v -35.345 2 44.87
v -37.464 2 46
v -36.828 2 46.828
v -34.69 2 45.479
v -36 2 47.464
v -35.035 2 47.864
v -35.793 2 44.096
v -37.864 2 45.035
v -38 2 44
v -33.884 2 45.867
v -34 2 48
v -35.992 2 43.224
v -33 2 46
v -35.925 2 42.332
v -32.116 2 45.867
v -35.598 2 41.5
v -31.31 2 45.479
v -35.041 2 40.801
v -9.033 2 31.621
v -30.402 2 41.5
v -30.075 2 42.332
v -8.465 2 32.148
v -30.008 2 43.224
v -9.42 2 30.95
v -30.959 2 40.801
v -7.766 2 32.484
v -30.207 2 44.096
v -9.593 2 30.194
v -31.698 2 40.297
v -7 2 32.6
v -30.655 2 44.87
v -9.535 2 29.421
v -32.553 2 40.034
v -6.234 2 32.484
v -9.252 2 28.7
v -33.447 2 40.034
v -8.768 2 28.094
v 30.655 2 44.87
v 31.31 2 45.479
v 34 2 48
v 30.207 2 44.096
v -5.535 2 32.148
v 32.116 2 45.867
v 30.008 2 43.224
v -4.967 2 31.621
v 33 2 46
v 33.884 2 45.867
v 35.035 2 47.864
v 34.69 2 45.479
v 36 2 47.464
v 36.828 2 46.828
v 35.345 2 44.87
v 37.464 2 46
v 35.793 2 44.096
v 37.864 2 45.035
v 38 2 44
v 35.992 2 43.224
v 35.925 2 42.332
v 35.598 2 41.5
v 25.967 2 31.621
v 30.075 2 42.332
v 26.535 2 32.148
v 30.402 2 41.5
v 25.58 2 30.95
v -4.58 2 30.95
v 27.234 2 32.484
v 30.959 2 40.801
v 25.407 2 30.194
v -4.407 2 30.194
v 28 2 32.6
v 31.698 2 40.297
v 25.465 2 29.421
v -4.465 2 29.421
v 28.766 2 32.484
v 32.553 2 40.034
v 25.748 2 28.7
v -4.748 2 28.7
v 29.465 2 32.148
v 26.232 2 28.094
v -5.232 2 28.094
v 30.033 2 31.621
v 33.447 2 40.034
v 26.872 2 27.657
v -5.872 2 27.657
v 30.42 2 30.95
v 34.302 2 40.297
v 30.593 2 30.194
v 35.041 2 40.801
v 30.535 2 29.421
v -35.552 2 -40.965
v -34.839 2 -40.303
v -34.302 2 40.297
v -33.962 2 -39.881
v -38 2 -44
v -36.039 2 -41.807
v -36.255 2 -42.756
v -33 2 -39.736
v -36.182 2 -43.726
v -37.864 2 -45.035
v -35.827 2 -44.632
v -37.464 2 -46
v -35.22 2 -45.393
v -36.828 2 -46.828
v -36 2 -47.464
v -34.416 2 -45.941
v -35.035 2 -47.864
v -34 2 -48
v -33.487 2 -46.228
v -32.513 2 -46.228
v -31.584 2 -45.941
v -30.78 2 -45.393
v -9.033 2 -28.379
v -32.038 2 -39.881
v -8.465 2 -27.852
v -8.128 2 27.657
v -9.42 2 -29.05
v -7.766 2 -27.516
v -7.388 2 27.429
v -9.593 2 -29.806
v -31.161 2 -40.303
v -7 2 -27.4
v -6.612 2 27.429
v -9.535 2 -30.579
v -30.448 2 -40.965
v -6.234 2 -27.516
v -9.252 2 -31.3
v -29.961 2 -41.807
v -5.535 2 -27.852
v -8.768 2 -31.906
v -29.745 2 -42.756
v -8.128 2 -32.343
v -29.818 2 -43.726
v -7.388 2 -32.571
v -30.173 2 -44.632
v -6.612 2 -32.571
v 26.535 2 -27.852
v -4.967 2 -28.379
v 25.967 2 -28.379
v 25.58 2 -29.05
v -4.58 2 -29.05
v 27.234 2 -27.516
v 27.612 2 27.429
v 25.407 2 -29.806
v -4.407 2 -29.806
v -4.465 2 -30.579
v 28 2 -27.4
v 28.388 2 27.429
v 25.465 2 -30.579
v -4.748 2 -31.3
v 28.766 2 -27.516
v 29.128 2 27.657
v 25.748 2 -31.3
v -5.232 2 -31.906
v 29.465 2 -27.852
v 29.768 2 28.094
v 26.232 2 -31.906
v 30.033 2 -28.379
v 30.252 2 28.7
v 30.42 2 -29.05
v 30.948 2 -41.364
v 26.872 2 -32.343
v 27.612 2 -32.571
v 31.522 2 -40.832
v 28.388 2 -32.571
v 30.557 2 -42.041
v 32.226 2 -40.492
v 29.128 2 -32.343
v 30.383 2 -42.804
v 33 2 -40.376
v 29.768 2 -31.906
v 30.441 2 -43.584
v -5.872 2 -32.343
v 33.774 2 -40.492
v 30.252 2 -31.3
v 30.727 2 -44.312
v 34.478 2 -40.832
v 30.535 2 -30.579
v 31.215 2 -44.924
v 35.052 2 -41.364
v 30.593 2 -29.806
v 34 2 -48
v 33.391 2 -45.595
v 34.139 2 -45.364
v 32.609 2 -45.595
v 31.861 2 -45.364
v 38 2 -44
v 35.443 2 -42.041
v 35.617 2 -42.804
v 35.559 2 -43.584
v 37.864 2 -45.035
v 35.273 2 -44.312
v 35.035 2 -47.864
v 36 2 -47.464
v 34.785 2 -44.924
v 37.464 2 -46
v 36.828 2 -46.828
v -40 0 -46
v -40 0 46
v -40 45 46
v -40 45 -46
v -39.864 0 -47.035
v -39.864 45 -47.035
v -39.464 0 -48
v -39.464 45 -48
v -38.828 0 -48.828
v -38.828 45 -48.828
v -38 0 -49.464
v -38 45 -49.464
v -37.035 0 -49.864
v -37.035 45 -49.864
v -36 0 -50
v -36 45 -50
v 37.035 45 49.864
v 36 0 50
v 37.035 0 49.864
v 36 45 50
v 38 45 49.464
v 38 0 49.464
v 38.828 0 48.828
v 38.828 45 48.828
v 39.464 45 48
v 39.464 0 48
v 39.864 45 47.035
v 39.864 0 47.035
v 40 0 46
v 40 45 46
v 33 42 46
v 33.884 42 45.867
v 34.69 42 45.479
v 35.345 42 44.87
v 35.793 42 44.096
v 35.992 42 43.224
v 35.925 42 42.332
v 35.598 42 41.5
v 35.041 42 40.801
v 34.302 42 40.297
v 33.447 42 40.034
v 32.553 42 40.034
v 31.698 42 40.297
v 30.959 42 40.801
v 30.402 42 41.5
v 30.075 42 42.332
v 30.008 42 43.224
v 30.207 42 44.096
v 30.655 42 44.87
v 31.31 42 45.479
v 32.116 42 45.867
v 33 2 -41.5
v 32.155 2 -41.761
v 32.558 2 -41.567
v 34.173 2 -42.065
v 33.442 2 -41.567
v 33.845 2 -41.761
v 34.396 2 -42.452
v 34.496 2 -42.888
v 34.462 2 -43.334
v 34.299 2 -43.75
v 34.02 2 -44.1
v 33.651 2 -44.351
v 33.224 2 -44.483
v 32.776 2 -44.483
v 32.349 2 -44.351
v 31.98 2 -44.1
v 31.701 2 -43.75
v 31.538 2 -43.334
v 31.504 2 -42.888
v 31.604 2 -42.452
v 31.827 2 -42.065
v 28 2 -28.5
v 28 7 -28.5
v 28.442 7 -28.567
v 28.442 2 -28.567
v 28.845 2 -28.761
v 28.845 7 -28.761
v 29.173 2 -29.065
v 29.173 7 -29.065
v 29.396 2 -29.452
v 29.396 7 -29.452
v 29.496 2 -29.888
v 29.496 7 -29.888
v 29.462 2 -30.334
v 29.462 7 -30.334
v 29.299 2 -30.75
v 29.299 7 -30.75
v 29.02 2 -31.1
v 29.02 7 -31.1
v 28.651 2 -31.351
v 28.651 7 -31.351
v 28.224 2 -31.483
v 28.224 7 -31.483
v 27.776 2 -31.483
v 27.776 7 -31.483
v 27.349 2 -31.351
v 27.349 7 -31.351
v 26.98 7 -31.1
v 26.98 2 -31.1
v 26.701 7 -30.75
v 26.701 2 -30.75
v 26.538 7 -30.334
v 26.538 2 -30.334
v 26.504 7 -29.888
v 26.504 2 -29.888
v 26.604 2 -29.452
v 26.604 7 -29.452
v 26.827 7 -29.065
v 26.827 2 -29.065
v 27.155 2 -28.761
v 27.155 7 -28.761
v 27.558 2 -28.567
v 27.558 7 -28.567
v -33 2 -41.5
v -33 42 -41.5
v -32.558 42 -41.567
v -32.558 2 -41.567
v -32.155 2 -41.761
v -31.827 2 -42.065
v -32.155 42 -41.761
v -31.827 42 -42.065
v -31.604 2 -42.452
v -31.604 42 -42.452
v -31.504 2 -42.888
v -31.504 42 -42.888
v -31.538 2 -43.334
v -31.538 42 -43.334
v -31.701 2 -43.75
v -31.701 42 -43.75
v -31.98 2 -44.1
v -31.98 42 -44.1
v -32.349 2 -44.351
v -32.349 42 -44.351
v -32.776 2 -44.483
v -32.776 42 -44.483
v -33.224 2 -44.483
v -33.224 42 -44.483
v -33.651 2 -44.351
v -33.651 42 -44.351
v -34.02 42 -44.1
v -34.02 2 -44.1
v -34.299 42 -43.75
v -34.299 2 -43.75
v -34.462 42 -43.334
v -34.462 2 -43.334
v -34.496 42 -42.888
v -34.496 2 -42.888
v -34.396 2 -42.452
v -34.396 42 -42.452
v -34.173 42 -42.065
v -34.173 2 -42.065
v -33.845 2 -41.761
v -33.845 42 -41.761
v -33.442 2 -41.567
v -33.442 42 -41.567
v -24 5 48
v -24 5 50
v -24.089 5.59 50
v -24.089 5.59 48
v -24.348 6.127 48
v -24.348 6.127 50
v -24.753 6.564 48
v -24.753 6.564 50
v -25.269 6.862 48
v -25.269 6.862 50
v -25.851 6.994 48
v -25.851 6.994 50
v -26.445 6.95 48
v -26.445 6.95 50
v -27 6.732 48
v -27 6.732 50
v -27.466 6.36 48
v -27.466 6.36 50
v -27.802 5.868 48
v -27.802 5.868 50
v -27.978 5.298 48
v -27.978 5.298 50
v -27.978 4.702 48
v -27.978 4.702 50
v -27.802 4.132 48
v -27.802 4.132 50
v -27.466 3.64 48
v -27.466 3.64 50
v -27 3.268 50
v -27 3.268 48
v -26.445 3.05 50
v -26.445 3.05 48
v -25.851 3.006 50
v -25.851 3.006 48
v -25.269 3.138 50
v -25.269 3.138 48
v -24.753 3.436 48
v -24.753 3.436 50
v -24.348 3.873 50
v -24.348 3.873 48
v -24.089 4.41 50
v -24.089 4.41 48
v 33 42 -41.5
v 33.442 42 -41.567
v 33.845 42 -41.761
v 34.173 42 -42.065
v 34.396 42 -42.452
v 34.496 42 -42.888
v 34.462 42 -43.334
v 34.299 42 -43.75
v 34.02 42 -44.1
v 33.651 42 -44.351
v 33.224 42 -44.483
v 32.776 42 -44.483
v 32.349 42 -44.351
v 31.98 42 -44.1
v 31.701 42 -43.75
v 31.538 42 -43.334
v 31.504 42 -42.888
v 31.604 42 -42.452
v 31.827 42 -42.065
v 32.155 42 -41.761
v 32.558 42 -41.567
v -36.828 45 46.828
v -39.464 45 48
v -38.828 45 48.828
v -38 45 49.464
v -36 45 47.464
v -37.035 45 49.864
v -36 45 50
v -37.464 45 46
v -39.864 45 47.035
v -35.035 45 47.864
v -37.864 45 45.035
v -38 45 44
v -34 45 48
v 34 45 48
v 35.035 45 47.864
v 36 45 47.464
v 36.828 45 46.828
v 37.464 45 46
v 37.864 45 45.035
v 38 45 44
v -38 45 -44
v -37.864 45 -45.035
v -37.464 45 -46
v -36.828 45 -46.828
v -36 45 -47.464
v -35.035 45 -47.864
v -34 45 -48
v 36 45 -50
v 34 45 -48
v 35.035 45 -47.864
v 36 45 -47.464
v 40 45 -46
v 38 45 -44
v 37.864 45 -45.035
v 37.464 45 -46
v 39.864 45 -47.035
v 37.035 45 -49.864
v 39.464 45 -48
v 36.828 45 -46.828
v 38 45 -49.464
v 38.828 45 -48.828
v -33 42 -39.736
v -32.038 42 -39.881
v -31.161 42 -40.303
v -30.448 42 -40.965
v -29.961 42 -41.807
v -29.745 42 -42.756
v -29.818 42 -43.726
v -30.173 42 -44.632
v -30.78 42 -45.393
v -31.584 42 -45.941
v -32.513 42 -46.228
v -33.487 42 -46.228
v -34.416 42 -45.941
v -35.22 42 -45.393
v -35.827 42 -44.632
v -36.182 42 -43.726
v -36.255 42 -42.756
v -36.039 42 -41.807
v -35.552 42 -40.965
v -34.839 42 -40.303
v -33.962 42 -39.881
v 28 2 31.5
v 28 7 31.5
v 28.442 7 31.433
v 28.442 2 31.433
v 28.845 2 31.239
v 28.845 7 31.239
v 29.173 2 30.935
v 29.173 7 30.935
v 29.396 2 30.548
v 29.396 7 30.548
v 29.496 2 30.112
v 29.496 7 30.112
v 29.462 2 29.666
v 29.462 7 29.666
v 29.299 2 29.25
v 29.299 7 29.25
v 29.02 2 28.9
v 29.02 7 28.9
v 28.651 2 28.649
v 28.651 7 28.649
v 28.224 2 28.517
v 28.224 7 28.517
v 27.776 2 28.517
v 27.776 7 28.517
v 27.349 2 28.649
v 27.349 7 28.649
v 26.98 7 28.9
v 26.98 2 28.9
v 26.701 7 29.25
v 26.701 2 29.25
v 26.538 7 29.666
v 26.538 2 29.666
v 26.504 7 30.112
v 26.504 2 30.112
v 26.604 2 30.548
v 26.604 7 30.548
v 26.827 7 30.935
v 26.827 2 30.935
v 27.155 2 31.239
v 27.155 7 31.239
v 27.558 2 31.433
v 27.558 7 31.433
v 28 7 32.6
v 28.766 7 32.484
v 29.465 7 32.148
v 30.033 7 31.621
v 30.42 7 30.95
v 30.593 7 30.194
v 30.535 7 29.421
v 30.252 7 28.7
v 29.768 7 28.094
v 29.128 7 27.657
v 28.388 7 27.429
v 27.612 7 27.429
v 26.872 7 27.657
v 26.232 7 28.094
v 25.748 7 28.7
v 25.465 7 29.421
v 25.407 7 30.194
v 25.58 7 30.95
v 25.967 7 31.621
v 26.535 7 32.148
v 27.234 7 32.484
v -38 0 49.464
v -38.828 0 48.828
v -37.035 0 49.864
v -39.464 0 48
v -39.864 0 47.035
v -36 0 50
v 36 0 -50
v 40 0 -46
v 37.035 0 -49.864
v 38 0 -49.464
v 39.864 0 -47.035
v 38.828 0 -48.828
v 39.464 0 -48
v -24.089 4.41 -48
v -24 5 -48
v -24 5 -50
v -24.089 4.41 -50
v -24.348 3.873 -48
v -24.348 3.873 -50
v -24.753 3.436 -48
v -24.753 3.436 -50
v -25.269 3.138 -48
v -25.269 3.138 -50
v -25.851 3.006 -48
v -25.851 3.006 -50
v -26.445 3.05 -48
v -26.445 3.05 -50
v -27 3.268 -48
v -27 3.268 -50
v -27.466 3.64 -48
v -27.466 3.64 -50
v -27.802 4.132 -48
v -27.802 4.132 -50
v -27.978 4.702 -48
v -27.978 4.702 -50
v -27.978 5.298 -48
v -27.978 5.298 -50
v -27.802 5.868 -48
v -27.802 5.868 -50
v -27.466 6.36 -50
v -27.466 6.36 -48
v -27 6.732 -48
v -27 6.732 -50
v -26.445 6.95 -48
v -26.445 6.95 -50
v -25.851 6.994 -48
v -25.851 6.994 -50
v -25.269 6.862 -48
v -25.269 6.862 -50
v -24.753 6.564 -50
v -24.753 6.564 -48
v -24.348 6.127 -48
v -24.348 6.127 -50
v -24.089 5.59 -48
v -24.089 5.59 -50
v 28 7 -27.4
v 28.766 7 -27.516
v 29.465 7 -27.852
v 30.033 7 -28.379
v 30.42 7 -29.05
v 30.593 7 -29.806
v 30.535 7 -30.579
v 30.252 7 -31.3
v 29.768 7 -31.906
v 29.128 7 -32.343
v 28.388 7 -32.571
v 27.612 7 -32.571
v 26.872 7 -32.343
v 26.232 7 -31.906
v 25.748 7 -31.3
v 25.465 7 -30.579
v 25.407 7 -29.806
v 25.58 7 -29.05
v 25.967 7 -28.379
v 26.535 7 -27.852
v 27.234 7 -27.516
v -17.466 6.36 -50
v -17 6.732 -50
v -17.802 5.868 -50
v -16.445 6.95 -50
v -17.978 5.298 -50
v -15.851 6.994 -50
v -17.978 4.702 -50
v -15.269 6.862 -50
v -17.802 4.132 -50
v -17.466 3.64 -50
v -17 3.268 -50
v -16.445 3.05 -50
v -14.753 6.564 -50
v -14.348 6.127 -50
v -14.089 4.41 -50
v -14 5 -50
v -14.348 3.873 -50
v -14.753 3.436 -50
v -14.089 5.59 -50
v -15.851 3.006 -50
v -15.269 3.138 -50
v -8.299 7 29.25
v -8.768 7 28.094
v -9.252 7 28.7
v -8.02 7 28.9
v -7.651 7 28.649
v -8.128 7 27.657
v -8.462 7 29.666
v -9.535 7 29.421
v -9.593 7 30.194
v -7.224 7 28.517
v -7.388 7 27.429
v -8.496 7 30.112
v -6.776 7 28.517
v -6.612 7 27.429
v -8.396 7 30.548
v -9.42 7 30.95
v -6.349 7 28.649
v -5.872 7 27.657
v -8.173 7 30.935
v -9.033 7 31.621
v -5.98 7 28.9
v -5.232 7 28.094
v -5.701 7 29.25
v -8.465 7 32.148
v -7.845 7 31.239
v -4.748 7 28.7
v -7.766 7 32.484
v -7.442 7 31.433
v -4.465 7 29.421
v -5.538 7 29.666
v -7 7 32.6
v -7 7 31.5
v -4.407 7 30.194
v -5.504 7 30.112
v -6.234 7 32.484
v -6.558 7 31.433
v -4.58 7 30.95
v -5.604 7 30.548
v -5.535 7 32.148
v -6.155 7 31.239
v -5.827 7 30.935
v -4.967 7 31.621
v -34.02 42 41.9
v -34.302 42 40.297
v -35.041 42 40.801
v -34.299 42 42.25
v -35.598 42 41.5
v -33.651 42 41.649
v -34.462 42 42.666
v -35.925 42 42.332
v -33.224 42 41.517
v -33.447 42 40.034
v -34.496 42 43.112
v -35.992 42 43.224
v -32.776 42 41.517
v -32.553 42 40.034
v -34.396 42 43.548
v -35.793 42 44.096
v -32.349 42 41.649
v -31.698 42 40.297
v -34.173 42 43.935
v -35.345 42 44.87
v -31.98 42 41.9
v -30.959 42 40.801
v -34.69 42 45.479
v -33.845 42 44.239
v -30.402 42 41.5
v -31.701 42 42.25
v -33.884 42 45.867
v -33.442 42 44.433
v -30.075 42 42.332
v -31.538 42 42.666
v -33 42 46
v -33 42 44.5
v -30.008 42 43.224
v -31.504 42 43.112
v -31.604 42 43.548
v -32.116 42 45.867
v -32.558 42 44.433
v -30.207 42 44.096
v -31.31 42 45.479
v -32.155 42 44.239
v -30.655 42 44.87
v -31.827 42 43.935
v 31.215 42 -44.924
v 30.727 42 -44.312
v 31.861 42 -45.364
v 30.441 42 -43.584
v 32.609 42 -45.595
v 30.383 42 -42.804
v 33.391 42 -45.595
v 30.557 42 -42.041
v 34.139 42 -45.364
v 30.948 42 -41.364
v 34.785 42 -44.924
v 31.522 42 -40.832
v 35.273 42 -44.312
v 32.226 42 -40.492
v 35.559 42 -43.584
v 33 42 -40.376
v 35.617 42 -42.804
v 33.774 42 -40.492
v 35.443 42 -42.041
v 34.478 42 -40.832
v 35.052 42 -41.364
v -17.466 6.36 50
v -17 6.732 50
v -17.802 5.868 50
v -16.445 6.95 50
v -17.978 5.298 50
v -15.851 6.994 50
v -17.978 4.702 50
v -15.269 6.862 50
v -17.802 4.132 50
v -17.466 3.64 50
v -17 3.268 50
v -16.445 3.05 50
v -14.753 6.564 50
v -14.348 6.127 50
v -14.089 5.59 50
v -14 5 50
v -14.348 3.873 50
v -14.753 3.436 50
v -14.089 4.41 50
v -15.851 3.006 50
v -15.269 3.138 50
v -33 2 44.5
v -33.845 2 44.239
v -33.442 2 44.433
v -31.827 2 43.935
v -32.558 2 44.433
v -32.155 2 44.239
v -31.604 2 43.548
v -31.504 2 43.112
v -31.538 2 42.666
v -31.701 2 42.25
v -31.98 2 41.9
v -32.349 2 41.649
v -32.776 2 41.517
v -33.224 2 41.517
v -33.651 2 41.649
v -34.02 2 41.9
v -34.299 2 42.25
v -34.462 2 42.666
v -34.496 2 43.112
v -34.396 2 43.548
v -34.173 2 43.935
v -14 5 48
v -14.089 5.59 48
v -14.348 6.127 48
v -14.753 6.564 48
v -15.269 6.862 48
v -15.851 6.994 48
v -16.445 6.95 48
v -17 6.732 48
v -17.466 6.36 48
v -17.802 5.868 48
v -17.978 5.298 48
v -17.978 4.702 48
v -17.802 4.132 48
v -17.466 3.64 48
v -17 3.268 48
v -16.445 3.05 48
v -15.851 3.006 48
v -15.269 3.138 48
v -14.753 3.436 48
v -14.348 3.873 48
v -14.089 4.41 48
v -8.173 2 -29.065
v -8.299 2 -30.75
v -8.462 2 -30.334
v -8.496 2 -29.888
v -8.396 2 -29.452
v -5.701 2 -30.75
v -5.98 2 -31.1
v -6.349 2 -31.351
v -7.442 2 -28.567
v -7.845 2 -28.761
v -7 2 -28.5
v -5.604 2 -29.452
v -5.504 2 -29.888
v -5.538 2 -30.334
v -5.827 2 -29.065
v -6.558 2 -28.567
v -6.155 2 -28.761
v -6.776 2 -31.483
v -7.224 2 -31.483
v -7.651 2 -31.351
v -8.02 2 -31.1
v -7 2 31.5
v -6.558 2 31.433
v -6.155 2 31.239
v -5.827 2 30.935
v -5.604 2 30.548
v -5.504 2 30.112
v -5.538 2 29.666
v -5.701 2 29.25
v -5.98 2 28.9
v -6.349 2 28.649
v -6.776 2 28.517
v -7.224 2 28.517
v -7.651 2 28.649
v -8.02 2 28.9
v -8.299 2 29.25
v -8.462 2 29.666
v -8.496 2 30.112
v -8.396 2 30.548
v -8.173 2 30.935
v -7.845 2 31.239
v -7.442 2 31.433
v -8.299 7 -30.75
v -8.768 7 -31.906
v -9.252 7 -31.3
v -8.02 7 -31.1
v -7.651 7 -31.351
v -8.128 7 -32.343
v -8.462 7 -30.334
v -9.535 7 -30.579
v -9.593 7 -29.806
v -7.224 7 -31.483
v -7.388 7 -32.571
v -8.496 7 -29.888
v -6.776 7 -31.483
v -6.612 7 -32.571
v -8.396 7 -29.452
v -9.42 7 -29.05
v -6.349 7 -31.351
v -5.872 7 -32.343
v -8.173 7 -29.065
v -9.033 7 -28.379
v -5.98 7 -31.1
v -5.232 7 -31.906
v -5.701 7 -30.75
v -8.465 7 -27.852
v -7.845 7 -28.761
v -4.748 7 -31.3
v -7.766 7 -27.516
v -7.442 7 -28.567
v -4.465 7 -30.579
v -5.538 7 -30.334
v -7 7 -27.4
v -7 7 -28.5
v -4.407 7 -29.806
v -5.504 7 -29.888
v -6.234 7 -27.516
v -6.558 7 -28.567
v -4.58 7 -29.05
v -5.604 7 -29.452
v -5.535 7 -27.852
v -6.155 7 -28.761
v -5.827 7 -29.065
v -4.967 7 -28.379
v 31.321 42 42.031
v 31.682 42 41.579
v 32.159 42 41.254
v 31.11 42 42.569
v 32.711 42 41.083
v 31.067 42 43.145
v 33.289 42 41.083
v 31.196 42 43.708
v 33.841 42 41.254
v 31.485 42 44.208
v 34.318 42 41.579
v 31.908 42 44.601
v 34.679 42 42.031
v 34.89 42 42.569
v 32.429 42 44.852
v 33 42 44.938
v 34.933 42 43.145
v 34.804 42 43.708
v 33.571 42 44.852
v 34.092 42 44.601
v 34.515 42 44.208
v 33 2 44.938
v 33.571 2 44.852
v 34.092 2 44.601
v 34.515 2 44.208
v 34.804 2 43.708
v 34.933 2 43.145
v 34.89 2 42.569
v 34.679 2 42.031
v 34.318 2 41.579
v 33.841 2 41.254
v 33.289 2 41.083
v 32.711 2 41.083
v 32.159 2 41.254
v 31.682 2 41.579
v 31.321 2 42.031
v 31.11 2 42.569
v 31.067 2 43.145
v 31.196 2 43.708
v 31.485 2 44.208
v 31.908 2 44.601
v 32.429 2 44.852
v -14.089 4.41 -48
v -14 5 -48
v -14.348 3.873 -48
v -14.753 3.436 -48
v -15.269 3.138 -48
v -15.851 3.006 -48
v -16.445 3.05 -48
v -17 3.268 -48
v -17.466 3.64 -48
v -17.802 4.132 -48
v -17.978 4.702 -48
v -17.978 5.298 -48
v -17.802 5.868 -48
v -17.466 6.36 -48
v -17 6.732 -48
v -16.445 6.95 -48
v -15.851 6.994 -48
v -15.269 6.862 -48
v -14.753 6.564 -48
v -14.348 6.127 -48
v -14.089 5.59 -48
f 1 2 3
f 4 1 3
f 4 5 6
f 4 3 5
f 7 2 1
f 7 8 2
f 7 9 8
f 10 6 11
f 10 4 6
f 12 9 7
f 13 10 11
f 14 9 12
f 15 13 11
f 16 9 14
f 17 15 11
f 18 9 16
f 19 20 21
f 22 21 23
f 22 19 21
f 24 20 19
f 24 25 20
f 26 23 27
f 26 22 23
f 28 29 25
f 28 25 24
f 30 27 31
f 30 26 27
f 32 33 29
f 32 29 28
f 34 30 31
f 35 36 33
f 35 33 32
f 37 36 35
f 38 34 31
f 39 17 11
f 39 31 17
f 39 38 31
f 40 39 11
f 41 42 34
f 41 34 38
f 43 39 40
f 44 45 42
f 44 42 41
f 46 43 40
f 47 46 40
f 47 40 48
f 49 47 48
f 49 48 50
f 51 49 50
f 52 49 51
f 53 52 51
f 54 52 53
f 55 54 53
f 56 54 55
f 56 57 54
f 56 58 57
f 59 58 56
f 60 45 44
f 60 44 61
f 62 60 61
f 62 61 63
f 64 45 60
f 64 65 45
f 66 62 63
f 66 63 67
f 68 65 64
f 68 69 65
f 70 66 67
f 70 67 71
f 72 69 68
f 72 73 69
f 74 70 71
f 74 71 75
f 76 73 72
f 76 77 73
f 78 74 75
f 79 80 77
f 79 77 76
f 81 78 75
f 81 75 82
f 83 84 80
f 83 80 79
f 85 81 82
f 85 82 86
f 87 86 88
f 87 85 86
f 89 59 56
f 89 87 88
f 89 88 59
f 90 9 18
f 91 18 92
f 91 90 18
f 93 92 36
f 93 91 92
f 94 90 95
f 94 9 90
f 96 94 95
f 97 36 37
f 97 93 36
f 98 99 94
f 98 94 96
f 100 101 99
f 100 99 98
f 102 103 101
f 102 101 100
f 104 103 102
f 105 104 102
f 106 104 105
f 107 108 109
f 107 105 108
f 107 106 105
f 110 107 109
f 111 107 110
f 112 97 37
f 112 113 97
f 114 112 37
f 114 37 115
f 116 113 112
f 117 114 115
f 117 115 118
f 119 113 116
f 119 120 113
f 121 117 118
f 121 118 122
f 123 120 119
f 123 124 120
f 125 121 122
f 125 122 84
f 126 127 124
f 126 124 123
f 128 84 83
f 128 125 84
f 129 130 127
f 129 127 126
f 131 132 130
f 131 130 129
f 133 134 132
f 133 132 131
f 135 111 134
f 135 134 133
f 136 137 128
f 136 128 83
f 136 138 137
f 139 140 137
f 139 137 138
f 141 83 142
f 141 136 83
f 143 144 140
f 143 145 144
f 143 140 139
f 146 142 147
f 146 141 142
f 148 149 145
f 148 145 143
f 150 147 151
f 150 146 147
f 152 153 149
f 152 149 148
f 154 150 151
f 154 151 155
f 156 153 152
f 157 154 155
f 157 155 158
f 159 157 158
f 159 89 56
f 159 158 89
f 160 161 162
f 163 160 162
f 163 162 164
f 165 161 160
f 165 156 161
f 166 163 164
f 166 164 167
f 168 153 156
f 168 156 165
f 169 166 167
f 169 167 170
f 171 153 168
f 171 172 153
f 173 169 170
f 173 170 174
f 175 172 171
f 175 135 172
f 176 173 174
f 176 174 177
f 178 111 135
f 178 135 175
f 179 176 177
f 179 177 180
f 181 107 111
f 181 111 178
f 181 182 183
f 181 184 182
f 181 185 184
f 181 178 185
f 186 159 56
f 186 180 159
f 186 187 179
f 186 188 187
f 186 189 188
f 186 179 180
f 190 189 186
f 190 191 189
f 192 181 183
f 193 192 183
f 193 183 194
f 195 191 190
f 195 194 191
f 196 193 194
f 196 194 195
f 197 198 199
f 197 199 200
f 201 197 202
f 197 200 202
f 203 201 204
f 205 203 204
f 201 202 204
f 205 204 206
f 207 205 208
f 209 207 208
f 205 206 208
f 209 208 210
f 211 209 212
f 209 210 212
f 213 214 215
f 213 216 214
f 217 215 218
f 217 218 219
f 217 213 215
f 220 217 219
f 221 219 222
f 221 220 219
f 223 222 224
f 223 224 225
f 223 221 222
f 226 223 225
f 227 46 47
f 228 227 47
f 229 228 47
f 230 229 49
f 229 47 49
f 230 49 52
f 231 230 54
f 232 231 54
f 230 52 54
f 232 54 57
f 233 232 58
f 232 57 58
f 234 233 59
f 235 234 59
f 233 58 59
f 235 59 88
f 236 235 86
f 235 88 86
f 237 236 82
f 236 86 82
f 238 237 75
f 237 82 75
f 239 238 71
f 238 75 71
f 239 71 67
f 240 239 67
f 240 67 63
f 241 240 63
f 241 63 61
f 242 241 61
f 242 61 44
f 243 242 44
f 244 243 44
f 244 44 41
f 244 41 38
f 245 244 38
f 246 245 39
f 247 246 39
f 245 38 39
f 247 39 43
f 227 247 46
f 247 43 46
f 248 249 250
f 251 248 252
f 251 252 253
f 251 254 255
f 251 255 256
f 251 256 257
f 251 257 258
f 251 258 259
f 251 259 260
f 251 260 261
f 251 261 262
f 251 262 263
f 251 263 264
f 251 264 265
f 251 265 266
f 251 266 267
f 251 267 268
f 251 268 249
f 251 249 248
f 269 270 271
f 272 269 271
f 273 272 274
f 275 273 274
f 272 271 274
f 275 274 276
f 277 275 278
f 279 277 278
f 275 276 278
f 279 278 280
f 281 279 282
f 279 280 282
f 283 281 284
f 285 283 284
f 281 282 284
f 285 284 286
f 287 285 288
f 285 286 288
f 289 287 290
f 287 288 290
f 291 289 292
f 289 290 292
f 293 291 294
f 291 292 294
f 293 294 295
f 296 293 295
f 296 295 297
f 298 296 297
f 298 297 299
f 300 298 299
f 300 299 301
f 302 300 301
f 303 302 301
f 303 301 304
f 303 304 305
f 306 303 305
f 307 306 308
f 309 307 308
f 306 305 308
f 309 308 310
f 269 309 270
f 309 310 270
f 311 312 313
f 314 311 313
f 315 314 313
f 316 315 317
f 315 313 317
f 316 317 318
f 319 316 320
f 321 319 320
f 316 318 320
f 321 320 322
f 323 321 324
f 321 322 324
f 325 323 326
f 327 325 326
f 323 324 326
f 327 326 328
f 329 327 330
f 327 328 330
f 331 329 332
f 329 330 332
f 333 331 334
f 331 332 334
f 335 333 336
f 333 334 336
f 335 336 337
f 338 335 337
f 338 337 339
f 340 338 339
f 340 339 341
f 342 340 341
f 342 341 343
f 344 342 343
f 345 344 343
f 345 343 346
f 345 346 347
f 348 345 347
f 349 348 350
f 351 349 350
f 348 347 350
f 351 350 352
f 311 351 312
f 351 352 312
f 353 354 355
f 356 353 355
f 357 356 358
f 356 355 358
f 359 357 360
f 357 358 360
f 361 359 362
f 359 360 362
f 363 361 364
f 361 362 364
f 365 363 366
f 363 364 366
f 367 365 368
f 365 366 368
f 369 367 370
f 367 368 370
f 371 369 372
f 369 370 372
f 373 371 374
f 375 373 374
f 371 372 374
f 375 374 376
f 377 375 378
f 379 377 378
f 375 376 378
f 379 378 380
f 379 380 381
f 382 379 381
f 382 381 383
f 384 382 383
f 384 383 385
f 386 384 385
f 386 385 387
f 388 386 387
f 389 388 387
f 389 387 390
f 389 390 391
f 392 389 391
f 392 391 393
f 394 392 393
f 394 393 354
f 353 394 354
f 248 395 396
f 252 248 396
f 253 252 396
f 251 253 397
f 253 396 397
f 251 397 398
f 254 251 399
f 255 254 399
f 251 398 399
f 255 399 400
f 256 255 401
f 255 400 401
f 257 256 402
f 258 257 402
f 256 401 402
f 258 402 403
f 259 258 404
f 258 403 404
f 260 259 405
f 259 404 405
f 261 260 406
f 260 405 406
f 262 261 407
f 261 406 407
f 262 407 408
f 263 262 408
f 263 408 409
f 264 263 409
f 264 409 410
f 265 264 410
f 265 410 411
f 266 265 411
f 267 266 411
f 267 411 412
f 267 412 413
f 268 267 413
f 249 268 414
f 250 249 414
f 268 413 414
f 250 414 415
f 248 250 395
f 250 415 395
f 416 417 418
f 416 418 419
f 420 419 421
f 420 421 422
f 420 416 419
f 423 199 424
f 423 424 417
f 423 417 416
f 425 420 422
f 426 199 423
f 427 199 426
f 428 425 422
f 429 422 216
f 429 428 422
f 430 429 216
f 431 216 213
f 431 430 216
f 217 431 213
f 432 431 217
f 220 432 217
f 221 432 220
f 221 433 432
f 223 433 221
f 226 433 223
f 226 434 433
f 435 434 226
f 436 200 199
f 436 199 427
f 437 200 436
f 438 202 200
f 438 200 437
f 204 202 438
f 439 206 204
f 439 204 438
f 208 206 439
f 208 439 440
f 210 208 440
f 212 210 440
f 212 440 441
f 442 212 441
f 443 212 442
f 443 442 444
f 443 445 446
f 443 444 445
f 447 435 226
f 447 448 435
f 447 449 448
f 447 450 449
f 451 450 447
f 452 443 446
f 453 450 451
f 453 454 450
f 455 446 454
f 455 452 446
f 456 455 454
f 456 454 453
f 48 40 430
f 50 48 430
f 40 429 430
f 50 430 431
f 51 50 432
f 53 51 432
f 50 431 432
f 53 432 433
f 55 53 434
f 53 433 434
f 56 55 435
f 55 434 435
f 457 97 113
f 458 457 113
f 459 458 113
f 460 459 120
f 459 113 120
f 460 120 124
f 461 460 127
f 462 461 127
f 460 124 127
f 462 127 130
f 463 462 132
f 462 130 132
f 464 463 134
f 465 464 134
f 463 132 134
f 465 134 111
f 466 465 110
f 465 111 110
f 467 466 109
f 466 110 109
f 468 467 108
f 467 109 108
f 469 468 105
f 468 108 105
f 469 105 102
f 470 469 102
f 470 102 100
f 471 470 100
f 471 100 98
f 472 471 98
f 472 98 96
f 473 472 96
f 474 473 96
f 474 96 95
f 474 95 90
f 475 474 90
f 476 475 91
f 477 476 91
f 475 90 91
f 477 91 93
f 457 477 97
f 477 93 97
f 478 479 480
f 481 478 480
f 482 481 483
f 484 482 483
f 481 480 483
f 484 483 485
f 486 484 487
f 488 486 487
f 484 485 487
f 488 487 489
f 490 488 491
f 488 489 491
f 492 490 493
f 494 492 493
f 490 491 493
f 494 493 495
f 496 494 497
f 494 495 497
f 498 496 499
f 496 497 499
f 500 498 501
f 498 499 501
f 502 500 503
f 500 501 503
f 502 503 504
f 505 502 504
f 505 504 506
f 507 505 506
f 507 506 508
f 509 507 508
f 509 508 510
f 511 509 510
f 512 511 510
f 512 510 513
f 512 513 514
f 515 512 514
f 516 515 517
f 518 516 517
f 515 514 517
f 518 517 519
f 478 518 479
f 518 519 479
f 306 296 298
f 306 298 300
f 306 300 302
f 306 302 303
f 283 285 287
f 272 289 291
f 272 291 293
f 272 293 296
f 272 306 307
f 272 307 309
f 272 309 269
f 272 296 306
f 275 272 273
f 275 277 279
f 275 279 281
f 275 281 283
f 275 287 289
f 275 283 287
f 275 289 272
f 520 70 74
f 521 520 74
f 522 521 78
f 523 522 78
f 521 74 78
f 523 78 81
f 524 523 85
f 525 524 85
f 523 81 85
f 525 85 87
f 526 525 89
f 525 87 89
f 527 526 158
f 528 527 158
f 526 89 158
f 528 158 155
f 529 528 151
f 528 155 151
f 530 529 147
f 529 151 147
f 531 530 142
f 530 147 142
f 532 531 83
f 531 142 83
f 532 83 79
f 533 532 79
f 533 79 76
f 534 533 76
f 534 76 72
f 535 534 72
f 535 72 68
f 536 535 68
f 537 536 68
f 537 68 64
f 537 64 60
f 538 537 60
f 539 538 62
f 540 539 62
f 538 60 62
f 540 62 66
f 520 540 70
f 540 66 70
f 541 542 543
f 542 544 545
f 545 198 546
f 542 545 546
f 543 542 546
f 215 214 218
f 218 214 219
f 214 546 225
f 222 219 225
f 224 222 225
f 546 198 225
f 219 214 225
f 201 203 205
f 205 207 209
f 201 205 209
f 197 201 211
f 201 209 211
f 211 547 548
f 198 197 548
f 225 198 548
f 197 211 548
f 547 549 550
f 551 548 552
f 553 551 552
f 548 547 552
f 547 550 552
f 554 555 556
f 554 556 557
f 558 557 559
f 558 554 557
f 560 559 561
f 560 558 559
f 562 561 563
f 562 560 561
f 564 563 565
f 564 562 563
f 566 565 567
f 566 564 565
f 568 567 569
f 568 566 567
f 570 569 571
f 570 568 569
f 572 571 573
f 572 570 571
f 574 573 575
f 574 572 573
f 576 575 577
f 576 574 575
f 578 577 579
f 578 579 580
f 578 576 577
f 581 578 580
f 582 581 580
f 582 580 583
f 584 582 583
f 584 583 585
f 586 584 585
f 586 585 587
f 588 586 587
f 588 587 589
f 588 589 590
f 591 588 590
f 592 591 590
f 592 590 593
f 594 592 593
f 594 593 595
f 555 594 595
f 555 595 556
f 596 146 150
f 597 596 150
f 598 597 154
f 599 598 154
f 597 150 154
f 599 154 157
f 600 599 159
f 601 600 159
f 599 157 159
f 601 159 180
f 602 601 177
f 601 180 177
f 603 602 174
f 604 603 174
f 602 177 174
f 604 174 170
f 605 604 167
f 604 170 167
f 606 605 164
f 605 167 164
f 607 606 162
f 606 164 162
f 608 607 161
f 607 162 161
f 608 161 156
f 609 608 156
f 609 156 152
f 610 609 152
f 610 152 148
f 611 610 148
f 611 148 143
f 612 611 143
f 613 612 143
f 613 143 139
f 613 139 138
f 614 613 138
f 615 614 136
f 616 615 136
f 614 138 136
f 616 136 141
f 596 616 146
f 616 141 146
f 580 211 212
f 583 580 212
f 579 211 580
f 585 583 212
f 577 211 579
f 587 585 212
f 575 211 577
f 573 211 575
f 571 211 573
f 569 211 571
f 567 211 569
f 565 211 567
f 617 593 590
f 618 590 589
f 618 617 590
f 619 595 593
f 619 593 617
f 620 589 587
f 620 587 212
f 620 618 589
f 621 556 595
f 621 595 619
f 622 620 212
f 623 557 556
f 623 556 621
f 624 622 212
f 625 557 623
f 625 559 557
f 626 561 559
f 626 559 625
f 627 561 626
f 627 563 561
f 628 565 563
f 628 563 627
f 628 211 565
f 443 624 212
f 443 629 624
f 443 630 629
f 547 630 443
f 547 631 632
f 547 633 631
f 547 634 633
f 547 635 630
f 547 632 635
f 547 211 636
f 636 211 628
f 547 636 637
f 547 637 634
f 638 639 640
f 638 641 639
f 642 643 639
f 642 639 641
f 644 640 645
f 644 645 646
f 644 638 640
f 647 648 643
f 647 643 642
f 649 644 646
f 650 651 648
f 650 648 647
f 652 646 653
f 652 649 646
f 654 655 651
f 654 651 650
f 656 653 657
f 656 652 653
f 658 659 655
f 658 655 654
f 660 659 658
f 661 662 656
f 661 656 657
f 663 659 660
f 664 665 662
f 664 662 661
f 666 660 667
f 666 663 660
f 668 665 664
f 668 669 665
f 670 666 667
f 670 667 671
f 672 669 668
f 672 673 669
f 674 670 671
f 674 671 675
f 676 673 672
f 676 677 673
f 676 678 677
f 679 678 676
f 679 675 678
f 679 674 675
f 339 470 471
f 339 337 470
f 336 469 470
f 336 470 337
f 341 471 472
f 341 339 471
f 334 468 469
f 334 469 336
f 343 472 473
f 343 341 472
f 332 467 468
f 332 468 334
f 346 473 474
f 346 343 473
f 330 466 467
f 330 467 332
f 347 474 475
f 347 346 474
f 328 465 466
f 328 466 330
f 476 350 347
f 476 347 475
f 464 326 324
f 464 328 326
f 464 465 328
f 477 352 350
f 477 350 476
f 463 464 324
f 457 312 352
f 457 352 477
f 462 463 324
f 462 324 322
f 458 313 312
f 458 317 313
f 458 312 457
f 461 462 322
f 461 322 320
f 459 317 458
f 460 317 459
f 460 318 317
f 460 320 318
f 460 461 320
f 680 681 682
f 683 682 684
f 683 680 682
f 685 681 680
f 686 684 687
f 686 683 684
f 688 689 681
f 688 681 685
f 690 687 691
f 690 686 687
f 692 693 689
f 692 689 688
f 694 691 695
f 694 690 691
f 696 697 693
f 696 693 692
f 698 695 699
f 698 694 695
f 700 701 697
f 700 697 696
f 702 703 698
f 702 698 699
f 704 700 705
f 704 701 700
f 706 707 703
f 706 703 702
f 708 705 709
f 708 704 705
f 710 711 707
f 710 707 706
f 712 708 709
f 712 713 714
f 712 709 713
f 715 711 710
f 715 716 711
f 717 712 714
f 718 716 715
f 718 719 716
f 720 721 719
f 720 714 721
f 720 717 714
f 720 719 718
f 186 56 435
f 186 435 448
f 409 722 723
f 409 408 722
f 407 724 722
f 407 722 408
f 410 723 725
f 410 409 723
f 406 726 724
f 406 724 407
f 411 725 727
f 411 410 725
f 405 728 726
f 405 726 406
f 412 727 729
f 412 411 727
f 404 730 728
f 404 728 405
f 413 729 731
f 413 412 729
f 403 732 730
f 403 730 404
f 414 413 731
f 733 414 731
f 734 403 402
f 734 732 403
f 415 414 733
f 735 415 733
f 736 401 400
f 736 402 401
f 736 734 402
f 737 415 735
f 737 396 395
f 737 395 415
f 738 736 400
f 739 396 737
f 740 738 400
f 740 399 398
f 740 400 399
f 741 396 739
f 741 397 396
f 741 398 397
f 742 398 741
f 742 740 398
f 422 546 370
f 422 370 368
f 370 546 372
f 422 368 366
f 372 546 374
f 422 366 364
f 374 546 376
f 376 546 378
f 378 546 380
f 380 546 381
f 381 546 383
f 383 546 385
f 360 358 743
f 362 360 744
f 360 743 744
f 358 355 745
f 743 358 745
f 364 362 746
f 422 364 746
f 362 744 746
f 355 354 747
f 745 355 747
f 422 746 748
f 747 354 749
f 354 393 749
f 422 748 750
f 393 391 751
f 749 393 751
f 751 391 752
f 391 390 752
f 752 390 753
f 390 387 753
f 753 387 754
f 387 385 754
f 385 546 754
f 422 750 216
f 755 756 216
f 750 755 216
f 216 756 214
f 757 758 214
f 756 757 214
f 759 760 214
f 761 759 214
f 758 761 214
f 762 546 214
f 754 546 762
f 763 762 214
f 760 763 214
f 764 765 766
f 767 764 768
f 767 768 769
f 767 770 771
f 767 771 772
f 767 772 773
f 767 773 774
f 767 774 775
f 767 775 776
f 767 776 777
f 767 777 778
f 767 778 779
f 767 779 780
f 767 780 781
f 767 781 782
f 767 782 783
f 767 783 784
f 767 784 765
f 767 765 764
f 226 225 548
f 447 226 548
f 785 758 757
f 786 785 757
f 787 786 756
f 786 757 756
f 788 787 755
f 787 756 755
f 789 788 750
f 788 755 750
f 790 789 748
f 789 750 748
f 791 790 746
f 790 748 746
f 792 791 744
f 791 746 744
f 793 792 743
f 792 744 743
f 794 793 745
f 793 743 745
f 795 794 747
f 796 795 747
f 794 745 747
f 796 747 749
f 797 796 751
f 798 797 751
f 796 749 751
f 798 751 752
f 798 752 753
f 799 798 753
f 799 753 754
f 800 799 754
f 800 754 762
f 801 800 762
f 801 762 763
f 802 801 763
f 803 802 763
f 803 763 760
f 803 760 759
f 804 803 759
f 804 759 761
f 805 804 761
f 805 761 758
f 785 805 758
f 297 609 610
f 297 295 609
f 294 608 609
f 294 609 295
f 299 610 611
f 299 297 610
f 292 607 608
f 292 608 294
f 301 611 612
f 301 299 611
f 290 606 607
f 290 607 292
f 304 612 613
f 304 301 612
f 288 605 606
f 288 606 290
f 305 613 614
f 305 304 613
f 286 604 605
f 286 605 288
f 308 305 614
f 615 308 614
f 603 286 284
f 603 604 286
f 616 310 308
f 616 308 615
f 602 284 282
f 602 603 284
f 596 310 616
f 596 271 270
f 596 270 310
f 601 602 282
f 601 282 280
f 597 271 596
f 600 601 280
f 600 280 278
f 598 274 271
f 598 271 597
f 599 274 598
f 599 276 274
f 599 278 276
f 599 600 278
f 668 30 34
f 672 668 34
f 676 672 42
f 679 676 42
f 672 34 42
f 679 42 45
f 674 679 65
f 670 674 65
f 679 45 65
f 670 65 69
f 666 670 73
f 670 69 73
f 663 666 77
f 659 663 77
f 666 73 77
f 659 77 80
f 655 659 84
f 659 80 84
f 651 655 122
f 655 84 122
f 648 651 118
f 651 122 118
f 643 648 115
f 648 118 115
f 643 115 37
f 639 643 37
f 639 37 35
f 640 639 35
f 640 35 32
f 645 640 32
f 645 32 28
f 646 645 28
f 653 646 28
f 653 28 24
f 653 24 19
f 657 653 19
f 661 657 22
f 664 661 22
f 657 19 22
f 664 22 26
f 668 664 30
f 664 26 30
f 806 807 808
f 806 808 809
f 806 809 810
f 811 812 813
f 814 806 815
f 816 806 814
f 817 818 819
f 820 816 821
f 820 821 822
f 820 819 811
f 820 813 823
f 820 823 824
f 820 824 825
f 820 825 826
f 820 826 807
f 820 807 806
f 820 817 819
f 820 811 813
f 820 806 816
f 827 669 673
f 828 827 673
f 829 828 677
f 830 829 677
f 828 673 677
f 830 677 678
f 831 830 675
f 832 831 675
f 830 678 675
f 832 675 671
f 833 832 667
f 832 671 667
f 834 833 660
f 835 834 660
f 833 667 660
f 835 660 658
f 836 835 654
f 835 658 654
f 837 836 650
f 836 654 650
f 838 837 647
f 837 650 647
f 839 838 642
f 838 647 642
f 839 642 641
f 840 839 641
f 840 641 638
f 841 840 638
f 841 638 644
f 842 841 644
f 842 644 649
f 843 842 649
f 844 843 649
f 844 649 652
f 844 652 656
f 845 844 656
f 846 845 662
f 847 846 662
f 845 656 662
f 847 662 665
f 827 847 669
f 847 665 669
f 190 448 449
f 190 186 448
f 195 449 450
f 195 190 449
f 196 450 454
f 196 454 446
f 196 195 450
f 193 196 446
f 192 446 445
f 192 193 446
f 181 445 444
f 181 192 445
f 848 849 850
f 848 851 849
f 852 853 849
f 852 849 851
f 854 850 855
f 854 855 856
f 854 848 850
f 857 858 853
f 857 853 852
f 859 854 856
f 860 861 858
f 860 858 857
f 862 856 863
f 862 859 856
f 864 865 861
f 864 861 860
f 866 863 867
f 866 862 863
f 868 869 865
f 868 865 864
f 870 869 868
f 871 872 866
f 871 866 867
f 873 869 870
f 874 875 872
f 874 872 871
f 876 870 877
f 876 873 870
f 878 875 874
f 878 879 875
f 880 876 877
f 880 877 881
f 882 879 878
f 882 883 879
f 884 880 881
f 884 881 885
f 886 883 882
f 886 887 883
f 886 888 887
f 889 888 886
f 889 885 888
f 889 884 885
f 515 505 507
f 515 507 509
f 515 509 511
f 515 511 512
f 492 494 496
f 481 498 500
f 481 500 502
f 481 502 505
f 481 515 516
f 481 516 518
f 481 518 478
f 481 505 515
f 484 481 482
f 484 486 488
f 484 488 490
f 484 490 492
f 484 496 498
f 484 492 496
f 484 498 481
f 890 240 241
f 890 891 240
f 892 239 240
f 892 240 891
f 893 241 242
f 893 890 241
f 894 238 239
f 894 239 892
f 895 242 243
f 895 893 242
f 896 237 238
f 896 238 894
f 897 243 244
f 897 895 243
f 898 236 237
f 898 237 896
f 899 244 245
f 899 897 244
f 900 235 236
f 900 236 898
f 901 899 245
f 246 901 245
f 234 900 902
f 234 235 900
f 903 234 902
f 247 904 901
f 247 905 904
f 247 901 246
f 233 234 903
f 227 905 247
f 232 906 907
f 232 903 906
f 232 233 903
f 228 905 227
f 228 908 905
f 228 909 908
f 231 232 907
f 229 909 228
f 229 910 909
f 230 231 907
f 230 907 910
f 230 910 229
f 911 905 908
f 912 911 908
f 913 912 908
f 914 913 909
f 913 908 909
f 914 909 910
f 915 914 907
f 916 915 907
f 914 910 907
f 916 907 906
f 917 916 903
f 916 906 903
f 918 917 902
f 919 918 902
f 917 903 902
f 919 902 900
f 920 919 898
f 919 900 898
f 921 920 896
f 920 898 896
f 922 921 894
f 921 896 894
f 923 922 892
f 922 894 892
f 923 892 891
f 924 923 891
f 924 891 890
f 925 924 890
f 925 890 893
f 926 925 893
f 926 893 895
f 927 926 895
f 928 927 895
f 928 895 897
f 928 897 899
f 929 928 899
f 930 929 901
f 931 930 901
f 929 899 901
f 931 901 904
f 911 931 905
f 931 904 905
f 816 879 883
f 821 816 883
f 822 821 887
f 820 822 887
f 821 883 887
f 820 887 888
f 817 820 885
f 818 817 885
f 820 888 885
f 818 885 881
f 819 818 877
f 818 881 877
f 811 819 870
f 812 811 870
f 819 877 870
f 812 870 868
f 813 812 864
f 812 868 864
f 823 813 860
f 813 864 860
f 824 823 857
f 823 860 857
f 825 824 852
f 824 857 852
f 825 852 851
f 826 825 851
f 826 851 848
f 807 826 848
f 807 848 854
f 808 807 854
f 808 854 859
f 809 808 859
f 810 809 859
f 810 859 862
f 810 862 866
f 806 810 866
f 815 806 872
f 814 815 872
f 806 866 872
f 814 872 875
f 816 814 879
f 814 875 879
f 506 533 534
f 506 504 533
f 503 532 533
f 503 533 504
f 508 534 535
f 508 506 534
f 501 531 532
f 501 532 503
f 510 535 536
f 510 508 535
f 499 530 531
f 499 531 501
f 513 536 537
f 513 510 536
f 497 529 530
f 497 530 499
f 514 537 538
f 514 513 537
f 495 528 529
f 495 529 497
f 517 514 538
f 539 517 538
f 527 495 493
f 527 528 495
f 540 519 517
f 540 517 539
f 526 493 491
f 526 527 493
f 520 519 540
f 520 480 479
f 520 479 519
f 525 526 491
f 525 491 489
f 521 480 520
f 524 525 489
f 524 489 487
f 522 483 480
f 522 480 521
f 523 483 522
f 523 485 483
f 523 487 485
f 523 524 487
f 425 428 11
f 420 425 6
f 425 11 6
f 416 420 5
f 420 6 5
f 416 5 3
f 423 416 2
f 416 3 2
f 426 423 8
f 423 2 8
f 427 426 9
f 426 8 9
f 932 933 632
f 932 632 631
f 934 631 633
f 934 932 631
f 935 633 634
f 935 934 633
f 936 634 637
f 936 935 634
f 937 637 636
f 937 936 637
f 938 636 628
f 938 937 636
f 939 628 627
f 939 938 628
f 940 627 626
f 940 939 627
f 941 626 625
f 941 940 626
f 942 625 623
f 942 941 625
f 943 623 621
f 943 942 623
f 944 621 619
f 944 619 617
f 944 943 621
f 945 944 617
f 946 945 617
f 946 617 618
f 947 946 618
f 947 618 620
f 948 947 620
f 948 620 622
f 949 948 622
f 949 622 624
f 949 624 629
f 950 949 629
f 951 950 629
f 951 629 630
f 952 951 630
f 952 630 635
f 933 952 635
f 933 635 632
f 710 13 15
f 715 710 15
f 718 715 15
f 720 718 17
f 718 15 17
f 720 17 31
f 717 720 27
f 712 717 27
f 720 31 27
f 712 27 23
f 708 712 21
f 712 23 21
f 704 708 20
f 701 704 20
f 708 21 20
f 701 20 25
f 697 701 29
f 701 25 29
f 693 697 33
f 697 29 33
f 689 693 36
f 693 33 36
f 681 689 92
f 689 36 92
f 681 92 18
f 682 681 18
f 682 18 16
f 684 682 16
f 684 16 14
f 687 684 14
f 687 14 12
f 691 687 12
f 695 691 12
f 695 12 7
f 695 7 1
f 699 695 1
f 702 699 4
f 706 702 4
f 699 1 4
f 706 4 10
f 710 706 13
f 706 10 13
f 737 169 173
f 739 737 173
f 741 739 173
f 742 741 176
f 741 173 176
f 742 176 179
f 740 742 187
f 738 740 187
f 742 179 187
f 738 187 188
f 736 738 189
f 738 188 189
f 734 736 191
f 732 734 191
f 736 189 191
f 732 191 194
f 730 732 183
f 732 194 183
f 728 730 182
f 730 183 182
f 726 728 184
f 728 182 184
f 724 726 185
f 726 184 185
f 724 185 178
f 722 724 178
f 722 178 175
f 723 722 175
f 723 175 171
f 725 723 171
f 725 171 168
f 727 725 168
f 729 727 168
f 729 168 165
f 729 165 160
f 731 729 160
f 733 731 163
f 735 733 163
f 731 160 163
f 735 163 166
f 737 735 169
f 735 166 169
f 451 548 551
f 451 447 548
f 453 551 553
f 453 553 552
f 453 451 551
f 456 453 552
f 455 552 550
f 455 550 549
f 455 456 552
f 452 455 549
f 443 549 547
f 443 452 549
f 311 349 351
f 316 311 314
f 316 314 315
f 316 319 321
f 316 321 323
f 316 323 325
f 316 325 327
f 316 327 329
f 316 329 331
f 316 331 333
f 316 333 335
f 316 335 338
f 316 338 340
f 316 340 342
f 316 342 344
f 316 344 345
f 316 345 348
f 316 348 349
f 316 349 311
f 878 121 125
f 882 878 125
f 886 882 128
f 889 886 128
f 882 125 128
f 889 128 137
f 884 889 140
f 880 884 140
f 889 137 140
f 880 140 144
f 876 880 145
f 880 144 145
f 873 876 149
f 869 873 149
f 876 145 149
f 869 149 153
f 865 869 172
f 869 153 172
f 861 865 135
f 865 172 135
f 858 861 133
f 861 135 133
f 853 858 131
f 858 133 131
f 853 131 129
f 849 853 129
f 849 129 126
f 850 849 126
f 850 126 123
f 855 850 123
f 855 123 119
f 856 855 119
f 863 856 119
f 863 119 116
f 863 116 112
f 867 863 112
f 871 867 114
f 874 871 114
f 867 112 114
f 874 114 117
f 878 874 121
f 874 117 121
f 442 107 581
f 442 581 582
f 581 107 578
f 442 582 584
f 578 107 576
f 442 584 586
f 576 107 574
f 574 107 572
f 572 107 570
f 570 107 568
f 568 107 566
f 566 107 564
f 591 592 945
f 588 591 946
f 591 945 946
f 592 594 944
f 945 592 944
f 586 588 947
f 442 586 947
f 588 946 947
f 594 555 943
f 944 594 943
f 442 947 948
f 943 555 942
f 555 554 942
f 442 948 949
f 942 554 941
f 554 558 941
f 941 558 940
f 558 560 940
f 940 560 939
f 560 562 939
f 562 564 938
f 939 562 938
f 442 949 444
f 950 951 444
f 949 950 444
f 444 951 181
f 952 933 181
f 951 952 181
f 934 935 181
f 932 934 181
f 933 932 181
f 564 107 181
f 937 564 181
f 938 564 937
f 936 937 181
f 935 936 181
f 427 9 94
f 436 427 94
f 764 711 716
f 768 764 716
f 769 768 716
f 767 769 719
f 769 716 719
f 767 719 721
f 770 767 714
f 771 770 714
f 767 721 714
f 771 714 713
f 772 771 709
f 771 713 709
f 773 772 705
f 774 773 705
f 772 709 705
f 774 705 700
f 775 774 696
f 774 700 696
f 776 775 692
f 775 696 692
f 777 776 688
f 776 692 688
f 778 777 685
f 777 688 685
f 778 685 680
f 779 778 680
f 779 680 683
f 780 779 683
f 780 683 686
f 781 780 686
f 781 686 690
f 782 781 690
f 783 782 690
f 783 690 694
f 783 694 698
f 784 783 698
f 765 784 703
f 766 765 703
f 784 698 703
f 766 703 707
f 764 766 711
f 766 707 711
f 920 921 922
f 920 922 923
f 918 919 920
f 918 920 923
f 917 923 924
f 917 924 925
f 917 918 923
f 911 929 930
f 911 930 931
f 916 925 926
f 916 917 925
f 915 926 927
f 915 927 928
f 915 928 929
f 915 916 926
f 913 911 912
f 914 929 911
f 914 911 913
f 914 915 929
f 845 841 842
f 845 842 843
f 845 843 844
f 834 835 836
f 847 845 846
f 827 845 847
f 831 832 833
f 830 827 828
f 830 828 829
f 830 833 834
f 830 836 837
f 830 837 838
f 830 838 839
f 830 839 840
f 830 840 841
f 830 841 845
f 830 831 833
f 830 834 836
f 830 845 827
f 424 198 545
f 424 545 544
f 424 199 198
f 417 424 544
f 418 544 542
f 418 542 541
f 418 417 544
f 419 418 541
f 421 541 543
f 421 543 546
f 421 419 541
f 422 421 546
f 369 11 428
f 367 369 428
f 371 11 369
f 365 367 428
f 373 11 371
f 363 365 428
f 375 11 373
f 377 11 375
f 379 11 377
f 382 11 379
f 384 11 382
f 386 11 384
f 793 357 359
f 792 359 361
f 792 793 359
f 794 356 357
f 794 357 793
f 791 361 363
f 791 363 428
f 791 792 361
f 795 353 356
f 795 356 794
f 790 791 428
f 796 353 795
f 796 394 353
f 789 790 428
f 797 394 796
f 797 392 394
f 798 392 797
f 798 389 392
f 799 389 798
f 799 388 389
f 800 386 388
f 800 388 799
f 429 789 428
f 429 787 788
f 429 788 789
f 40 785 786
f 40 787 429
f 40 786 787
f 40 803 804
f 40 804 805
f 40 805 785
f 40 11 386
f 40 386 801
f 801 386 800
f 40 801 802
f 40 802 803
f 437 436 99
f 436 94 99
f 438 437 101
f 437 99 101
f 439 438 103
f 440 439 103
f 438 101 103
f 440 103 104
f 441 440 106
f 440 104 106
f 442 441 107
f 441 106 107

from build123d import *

# Parameters (mm, degrees)
SKETCH1_W            = 80
SKETCH1_H            = 100
BOSS_EXTRUDE1_DEPTH  = 45
SHELL1_T             = -2
FILLET1_R            = 4
FILLET2_R            = 4
FILLET4_R            = 4
FILLET5_R            = 4
FILLET6_R            = 4
FILLET7_R            = 4
FILLET12_R           = 4
FILLET13_R           = 4
SKETCH33_R           = 2.6
BOSS_EXTRUDE9_DEPTH  = 5
SKETCH37_R           = 2.624374832
SKETCH37_R_2         = 3
SKETCH37_R_3         = 3.264262679
BOSS_EXTRUDE10_DEPTH = 40
SKETCH38_R           = 1.5
SKETCH38_R_2         = 1.938271083
CUT_EXTRUDE3_DEPTH   = 40
SKETCH39_R           = 1.5
CUT_EXTRUDE4_DEPTH   = 5
SKETCH40_R           = 2
CUT_EXTRUDE5_DEPTH   = 10
CUT_EXTRUDE6_START   = -10
SKETCH41_R           = 2
CUT_EXTRUDE6_DEPTH   = 10


with BuildPart() as part:
    # Sketch1 → Boss-Extrude1 (new body)
    with BuildSketch(Plane(origin=(0, 0, 0), x_dir=(1, 0, 0), z_dir=(0, 1, 0))):
        Rectangle(SKETCH1_W, SKETCH1_H)
    extrude(amount=BOSS_EXTRUDE1_DEPTH)

    # Shell1
    shell1_openings = [part.faces().sort_by_distance(p)[0] for p in [
        (0, 45, 0),
    ]]
    offset(amount=SHELL1_T, openings=shell1_openings, kind=Kind.INTERSECTION)

    # Fillet1
    fillet1_edges = [part.edges().sort_by_distance(p)[0] for p in [
        (-40, 22.5, 50),
    ]]
    fillet(fillet1_edges, radius=FILLET1_R)

    # Fillet2
    fillet2_edges = [part.edges().sort_by_distance(p)[0] for p in [
        (-38, 23.5, 48),
    ]]
    fillet(fillet2_edges, radius=FILLET2_R)

    # Fillet4
    fillet4_edges = [part.edges().sort_by_distance(p)[0] for p in [
        (-38, 23.5, -48),
    ]]
    fillet(fillet4_edges, radius=FILLET4_R)

    # Fillet5
    fillet5_edges = [part.edges().sort_by_distance(p)[0] for p in [
        (-40, 22.5, -50),
    ]]
    fillet(fillet5_edges, radius=FILLET5_R)

    # Fillet6
    fillet6_edges = [part.edges().sort_by_distance(p)[0] for p in [
        (38, 23.5, 48),
    ]]
    fillet(fillet6_edges, radius=FILLET6_R)

    # Fillet7
    fillet7_edges = [part.edges().sort_by_distance(p)[0] for p in [
        (40, 22.5, 50),
    ]]
    fillet(fillet7_edges, radius=FILLET7_R)

    # Fillet12
    fillet12_edges = [part.edges().sort_by_distance(p)[0] for p in [
        (40, 22.5, -50),
    ]]
    fillet(fillet12_edges, radius=FILLET12_R)

    # Fillet13
    fillet13_edges = [part.edges().sort_by_distance(p)[0] for p in [
        (38, 23.5, -48),
    ]]
    fillet(fillet13_edges, radius=FILLET13_R)

    # Sketch33 → Boss-Extrude9 (add)
    with BuildSketch(Plane(origin=(0, 2, 0), x_dir=(1, 0, 0), z_dir=(0, 1, 0))):
        with Locations(Location((28, 30, 0), (0, 0, 270))):
            Circle(SKETCH33_R)
        with Locations(Location((28, -30, 0), (0, 0, 270))):
            Circle(SKETCH33_R)
        with Locations(Location((-7, 30, 0), (0, 0, 270))):
            Circle(SKETCH33_R)
        with Locations(Location((-7, -30, 0), (0, 0, 270))):
            Circle(SKETCH33_R)
    extrude(amount=BOSS_EXTRUDE9_DEPTH)

    # Sketch37 → Boss-Extrude10 (add)
    with BuildSketch(Plane(origin=(0, 2, 0), x_dir=(1, 0, 0), z_dir=(0, 1, 0))):
        with Locations(Location((33, 43, 0), (0, 0, 270))):
            Circle(SKETCH37_R)
        with Locations(Location((33, -43, 0), (0, 0, 270))):
            Circle(SKETCH37_R_2)
        with Locations(Location((-33, 43, 0), (0, 0, 270))):
            Circle(SKETCH37_R_3)
        with Locations(Location((-33, -43, 0), (0, 0, 270))):
            Circle(SKETCH37_R_2)
    extrude(amount=BOSS_EXTRUDE10_DEPTH)

    # Sketch38 → Cut-Extrude3 (cut)
    with BuildSketch(Plane(origin=(0, 42, 0), x_dir=(1, 0, 0), z_dir=(0, 1, 0))):
        with Locations(Location((33, 43, 0), (0, 0, 270))):
            Circle(SKETCH38_R)
        with Locations(Location((33, -43, 0), (0, 0, 270))):
            Circle(SKETCH38_R_2)
        with Locations(Location((-33, 43, 0), (0, 0, 270))):
            Circle(SKETCH38_R)
        with Locations(Location((-33, -43, 0), (0, 0, 270))):
            Circle(SKETCH38_R)
    extrude(amount=-CUT_EXTRUDE3_DEPTH, mode=Mode.SUBTRACT)

    # Sketch39 → Cut-Extrude4 (cut)
    with BuildSketch(Plane(origin=(0, 7, 0), x_dir=(1, 0, 0), z_dir=(0, 1, 0))):
        with Locations(Location((28, 30, 0), (0, 0, 270))):
            Circle(SKETCH39_R)
        with Locations(Location((28, -30, 0), (0, 0, 270))):
            Circle(SKETCH39_R)
        with Locations(Location((-7, 30, 0), (0, 0, 270))):
            Circle(SKETCH39_R)
        with Locations(Location((-7, -30, 0), (0, 0, 270))):
            Circle(SKETCH39_R)
    extrude(amount=-CUT_EXTRUDE4_DEPTH, mode=Mode.SUBTRACT)

    # Sketch40 → Cut-Extrude5 (cut)
    with BuildSketch(Plane.XY.offset(50)):
        with Locations((-26, 5)):
            Circle(SKETCH40_R)
        with Locations((-16, 5)):
            Circle(SKETCH40_R)
    extrude(amount=-CUT_EXTRUDE5_DEPTH, mode=Mode.SUBTRACT)

    # Sketch41 → Cut-Extrude6 (cut)
    with BuildSketch(Plane(origin=(0, 0, -50), x_dir=(-1, 0, 0), z_dir=(0, 0, -1)).offset(CUT_EXTRUDE6_START)):
        with Locations(Location((26, 5, 0), (0, 0, 180))):
            Circle(SKETCH41_R)
        with Locations(Location((16, 5, 0), (0, 0, 180))):
            Circle(SKETCH41_R)
    extrude(amount=CUT_EXTRUDE6_DEPTH, mode=Mode.SUBTRACT)


solid = part.part
